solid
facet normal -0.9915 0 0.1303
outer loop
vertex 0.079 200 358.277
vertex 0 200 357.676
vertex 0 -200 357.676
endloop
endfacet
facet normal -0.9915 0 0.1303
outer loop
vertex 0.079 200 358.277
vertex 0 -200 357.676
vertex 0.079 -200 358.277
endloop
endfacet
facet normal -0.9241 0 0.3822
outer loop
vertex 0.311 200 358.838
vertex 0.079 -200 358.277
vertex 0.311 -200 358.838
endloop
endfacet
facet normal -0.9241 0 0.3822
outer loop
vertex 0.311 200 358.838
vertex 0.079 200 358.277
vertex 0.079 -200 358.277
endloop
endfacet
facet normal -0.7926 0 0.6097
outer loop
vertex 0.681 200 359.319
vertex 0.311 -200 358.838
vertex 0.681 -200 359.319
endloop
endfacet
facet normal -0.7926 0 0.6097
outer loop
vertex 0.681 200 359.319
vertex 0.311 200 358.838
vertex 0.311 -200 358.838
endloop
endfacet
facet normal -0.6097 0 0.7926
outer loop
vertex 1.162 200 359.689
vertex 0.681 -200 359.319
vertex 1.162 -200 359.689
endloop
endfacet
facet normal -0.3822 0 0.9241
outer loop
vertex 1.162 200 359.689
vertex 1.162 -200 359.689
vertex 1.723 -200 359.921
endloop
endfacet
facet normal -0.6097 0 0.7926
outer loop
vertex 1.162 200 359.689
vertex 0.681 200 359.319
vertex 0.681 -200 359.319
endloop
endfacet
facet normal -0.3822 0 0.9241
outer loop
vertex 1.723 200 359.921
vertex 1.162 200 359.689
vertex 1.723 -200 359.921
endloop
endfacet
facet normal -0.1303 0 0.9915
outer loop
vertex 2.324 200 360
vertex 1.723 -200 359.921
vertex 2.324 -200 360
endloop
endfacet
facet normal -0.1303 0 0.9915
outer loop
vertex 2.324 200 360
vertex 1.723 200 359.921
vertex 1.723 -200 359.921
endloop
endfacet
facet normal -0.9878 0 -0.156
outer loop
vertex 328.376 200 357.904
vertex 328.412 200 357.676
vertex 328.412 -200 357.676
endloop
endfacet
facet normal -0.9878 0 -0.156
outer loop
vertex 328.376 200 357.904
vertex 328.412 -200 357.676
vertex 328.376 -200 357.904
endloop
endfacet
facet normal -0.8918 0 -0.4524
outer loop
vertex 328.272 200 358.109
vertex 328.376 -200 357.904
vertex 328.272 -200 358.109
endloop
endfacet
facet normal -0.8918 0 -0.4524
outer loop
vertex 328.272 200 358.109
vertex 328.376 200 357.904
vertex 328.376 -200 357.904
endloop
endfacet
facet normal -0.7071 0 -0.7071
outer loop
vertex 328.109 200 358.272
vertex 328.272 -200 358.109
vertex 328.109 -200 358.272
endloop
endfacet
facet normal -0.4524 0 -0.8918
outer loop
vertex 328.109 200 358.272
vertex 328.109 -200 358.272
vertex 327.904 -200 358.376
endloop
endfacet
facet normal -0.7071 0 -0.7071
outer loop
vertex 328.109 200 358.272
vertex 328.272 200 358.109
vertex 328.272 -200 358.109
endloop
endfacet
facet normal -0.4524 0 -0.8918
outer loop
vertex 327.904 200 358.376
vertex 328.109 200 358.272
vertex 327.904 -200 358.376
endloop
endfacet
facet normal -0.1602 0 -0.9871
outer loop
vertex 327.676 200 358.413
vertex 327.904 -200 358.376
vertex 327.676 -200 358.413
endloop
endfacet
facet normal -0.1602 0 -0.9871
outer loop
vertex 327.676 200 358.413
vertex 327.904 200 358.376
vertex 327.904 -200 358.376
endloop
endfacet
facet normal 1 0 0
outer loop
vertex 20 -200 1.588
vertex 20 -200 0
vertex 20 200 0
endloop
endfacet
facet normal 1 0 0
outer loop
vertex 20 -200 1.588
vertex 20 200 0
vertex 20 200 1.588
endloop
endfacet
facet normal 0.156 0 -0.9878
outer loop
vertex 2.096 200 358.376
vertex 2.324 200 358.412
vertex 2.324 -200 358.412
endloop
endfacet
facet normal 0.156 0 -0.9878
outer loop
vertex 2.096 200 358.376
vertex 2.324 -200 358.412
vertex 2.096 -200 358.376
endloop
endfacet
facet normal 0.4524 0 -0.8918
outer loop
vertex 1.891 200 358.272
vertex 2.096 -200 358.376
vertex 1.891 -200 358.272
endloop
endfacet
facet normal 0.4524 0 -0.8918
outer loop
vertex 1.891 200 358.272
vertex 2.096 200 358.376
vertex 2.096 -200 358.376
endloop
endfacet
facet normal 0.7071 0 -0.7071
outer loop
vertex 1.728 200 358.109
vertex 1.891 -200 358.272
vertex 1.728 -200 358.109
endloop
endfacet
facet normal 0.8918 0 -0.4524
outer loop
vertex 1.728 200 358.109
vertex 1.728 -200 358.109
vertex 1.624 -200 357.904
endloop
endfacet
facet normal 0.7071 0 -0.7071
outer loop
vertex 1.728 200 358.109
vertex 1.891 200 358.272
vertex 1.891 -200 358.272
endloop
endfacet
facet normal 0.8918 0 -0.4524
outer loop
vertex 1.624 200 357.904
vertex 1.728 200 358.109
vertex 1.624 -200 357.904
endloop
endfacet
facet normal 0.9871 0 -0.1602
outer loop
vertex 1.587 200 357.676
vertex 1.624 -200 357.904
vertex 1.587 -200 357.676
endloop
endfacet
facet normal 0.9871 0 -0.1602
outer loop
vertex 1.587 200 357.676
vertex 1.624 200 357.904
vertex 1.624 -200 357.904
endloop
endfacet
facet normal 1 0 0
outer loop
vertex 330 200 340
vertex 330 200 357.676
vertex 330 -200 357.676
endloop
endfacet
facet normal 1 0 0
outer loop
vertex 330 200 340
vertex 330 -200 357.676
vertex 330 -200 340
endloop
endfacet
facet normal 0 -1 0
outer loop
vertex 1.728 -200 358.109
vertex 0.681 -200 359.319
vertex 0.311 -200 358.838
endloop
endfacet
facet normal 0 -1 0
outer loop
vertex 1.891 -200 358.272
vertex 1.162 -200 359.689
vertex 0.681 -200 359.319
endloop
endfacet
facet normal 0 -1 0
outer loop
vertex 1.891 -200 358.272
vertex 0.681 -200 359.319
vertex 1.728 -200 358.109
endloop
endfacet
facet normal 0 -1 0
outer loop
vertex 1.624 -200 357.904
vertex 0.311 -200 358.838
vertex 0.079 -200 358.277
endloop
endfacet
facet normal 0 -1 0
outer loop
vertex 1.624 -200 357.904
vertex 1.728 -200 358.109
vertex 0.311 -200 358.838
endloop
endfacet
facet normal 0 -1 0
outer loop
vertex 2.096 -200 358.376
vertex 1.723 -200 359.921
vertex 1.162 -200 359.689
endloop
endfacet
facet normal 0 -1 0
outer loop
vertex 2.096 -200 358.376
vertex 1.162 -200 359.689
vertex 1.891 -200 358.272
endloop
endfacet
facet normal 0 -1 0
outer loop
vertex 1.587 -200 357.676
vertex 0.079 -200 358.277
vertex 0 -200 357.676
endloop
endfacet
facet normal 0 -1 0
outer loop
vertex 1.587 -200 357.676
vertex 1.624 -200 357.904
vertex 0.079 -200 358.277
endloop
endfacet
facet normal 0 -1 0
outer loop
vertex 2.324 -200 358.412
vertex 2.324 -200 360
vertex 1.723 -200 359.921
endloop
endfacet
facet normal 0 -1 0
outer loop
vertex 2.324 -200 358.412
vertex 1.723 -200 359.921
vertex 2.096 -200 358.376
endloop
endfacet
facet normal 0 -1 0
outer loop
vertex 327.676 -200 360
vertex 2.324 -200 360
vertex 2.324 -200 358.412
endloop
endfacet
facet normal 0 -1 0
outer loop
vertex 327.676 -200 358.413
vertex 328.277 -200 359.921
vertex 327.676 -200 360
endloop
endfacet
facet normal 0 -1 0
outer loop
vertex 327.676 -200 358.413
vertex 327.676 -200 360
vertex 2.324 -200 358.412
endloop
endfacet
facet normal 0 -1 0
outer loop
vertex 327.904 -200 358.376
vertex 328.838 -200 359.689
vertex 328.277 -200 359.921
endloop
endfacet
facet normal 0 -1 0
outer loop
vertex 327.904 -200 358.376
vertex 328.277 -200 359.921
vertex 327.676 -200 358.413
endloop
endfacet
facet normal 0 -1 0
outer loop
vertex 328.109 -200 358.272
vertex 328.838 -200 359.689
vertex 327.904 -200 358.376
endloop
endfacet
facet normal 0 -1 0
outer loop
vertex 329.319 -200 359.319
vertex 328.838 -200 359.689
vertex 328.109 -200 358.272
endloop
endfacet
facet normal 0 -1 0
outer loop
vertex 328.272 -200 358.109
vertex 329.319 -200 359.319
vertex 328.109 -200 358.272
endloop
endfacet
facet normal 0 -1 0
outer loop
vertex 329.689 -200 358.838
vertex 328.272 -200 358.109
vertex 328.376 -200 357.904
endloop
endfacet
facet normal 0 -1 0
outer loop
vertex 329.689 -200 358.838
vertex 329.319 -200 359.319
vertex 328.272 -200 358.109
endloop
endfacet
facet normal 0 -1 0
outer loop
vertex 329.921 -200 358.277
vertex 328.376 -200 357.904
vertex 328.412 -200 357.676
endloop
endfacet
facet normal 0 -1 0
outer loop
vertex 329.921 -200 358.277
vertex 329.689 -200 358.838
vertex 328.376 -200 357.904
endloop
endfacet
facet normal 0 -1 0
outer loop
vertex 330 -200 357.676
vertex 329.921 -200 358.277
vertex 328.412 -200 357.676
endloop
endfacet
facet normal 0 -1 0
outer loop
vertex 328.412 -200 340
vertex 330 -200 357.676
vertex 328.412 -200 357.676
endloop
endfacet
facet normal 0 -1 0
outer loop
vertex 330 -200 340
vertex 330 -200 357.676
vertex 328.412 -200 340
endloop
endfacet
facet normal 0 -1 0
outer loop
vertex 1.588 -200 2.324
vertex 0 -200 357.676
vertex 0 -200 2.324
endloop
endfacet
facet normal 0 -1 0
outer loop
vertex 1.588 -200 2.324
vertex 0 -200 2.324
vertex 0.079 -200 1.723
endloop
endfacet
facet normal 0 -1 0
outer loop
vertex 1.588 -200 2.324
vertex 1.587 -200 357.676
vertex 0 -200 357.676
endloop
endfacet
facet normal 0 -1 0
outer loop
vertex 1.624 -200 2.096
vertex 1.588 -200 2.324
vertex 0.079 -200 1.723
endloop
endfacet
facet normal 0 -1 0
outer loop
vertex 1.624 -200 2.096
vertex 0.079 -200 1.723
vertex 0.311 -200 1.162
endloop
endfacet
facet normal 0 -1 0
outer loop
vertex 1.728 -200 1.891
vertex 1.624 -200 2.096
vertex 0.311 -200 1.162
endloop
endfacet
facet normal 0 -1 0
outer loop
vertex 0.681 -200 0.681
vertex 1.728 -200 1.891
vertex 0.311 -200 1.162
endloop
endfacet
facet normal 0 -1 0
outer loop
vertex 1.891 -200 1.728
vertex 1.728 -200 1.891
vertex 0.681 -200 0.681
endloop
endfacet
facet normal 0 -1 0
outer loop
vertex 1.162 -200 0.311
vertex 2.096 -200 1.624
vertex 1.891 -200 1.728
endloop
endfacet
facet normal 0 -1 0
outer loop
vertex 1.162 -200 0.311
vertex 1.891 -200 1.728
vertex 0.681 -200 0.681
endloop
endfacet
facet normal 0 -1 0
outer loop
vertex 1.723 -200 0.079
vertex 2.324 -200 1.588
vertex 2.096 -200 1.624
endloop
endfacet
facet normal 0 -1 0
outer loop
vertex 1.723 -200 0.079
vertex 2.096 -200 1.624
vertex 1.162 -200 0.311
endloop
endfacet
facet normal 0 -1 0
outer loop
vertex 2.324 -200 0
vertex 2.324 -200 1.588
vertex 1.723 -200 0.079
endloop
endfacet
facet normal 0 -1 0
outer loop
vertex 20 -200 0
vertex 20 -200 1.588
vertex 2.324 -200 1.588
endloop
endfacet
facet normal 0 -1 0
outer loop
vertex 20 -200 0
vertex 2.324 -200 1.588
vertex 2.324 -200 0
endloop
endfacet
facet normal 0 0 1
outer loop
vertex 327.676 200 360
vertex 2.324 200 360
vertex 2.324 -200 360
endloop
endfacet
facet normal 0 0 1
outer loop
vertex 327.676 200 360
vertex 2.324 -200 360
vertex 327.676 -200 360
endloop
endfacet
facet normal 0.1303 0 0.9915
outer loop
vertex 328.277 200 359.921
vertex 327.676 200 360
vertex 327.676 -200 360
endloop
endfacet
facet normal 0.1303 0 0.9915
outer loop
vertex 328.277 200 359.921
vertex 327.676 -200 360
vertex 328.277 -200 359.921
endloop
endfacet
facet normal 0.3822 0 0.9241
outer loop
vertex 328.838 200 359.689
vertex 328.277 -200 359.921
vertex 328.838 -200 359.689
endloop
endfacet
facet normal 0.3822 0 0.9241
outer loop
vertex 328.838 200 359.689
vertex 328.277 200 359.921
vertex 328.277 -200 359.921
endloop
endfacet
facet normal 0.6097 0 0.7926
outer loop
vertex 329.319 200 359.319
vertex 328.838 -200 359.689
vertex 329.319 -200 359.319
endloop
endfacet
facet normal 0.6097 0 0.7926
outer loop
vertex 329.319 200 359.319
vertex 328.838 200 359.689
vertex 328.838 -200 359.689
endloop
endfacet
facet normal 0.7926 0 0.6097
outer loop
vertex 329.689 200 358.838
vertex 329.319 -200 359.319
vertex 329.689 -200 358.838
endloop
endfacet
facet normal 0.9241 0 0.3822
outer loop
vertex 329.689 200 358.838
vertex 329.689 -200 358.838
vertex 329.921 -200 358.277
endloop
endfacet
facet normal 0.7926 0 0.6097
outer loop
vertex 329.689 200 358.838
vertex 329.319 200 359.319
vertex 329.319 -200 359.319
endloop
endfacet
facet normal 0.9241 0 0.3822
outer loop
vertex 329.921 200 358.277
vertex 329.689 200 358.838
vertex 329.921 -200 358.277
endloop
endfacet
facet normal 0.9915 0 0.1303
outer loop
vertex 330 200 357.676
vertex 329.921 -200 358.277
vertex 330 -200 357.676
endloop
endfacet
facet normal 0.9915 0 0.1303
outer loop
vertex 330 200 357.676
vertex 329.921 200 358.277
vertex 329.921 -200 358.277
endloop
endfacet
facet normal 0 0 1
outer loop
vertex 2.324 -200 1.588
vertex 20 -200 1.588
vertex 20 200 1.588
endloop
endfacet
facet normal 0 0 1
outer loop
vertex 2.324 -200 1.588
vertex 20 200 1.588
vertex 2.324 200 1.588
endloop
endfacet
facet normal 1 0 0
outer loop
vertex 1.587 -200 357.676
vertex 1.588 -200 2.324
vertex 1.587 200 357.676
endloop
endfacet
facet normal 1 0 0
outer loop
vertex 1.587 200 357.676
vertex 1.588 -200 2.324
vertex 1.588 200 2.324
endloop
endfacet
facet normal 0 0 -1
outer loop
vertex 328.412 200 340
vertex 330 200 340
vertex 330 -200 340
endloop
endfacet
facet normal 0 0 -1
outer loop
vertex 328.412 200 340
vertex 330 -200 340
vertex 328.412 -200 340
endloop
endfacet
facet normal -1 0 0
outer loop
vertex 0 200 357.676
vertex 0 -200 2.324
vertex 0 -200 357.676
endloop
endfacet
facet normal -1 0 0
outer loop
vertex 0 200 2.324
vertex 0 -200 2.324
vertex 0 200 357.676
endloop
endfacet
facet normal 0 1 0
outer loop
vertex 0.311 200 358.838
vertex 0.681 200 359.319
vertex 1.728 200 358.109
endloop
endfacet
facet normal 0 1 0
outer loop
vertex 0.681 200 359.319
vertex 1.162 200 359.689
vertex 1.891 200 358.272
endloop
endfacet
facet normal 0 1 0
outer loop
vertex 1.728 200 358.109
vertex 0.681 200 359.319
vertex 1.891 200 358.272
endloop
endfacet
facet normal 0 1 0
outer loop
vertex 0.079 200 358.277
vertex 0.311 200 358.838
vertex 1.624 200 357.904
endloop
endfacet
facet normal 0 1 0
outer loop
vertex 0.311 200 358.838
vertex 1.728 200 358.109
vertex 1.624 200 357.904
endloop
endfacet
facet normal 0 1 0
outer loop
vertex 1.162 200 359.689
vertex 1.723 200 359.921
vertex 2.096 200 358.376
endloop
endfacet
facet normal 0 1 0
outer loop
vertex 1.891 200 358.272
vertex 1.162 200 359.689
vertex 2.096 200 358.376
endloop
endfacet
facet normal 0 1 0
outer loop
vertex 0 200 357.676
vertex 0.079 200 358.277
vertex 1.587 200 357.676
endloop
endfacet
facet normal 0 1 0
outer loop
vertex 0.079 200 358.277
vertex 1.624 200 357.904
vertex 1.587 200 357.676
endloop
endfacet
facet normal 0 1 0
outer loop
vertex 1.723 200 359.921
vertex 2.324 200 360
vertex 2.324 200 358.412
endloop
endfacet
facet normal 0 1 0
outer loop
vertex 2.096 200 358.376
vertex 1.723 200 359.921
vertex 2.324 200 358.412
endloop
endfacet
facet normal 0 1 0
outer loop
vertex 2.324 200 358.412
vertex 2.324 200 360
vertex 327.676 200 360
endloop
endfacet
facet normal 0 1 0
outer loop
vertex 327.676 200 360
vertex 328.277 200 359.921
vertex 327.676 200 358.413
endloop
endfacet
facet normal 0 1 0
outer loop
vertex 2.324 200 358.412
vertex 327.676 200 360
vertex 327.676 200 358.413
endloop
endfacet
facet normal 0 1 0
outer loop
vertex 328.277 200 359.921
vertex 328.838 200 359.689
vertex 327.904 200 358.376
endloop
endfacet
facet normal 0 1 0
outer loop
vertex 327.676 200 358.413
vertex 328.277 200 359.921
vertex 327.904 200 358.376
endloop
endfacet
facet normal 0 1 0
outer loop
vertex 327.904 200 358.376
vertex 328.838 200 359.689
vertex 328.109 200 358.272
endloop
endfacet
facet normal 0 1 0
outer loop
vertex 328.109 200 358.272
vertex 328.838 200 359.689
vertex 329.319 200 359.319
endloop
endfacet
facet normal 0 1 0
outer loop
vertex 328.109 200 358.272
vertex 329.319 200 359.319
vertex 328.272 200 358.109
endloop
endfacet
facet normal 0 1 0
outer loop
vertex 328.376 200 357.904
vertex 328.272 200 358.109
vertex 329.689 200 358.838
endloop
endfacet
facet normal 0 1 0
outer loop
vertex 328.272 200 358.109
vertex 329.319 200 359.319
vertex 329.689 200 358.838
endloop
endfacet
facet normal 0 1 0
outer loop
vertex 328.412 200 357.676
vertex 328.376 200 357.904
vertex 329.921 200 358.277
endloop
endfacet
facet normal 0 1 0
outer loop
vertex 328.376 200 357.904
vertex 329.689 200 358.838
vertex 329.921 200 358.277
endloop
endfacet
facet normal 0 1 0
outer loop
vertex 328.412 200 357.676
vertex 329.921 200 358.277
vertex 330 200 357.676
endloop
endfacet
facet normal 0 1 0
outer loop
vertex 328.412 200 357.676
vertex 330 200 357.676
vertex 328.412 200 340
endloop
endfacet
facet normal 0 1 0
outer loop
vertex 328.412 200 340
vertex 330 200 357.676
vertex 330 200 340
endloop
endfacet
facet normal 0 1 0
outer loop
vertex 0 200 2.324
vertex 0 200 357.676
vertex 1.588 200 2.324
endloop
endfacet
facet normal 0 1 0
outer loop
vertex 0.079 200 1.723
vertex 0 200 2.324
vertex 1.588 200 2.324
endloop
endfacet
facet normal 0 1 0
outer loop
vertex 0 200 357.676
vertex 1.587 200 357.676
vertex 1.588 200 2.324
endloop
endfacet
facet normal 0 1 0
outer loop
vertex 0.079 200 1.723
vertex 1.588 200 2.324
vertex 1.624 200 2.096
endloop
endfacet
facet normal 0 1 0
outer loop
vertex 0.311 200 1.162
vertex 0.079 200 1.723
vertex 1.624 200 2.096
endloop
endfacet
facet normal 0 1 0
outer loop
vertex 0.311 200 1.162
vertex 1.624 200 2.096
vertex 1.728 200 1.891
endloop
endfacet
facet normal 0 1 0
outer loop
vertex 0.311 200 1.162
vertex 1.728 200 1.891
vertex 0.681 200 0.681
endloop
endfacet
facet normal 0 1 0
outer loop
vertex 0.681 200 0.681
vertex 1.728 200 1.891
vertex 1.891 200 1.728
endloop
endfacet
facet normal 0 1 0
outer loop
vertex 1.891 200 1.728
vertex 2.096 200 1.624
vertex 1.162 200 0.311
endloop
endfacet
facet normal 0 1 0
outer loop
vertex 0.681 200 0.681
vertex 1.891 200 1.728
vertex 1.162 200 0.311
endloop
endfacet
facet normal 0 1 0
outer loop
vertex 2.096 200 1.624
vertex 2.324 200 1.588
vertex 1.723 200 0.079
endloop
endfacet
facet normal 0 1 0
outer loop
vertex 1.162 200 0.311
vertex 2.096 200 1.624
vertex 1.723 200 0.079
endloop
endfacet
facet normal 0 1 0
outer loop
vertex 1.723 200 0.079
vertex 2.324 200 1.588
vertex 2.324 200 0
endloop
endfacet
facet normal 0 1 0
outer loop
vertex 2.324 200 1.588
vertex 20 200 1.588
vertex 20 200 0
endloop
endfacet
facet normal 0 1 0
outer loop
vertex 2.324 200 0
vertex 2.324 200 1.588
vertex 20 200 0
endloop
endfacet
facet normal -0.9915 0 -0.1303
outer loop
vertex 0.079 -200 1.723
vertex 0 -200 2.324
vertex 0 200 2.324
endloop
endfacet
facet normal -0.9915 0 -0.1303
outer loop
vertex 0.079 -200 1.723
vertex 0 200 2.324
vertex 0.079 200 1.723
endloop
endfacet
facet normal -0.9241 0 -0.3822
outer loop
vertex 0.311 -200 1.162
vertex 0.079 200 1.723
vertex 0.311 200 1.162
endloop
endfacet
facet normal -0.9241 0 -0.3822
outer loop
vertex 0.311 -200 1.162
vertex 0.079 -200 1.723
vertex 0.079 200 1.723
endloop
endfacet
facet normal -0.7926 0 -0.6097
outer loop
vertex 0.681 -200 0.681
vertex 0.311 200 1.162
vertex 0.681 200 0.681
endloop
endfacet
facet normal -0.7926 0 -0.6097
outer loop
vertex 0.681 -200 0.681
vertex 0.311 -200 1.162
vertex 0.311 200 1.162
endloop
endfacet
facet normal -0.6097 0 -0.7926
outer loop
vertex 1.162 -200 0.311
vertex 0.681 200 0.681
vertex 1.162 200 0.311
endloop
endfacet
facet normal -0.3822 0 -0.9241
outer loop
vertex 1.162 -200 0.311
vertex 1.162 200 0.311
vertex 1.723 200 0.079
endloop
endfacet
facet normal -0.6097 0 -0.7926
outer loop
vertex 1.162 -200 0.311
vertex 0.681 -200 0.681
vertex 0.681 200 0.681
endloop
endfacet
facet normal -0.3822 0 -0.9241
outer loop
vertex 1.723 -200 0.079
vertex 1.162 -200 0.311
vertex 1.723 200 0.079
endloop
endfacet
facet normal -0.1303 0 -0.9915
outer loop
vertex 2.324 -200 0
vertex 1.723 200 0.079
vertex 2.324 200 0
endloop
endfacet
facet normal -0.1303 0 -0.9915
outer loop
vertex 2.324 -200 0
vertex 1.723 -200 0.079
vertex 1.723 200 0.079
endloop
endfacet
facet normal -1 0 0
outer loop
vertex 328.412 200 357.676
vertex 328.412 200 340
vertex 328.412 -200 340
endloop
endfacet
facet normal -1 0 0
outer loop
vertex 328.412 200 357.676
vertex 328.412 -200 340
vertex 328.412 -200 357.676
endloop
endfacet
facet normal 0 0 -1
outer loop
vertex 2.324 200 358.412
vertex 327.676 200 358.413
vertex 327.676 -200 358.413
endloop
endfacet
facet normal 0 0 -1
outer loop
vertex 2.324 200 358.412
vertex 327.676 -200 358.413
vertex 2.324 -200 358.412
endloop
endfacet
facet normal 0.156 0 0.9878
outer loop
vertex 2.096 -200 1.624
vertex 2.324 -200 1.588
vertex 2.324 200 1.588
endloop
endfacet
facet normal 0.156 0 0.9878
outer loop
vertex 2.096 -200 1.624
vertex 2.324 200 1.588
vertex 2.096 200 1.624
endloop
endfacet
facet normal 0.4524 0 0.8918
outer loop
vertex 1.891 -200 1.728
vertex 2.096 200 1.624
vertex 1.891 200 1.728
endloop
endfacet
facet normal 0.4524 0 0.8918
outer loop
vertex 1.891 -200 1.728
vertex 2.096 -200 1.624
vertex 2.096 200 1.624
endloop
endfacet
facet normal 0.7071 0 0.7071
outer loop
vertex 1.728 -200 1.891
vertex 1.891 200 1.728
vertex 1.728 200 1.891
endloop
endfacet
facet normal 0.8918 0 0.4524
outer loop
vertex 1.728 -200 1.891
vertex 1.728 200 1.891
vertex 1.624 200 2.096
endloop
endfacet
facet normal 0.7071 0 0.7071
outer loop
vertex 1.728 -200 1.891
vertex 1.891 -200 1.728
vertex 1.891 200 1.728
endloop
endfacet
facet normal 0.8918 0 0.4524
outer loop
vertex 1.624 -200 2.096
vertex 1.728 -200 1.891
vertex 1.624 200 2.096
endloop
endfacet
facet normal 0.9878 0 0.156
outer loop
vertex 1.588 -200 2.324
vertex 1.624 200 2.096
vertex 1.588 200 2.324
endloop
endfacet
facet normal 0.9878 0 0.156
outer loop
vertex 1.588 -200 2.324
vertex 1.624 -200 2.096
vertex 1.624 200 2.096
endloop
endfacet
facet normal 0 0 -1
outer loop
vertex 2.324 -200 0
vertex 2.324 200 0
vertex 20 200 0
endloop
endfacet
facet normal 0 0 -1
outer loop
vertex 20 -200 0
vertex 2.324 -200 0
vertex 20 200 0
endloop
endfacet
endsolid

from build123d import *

# Parameters (mm, degrees)
SKETCH1_W                      = 1.5875
SKETCH1_H                      = 400
BASE_FLANGE1_DEPTH             = 360
EDGE_FLANGE1_STRIP_W           = 7.8232
EDGE_FLANGE1_STRIP_H           = 1.5875
EDGE_FLANGE1_STRIP_CUT_DEPTH   = 400
EDGE_FLANGE1_DEPTH             = 400
EDGE_FLANGE2_STRIP_W           = 7.8232
EDGE_FLANGE2_STRIP_H           = 1.5875
EDGE_FLANGE2_STRIP_CUT_DEPTH   = 400
EDGE_FLANGE2_STRIP_2_W         = 7.8232
EDGE_FLANGE2_STRIP_2_H         = 1.5875
EDGE_FLANGE2_STRIP_CUT_2_DEPTH = 400
EDGE_FLANGE2_DEPTH             = 400
EDGE_FLANGE2_BEND_DEPTH        = 400


# Sheet-metal steps are written as plain solids
with BuildPart() as part:
    # Sketch1 → Base-Flange1 (new body)
    with BuildSketch(Plane.XY):
        with Locations((0.79375, 0)):
            Rectangle(SKETCH1_W, SKETCH1_H)
    extrude(amount=BASE_FLANGE1_DEPTH)

    # Edge-Flange1 strip (across the edge) → Edge-Flange1 strip cut (cut)
    with BuildSketch(Plane(origin=(1.5875, 200, 360), x_dir=(0, 0, -1), z_dir=(0, -1, 0))):
        with Locations((-1.5875, -0.79375)):
            Rectangle(EDGE_FLANGE1_STRIP_W, EDGE_FLANGE1_STRIP_H)
    extrude(amount=EDGE_FLANGE1_STRIP_CUT_DEPTH, mode=Mode.SUBTRACT)

    # Edge-Flange1 section (across the edge) → Edge-Flange1 (add)
    with BuildSketch(Plane(origin=(1.5875, 200, 360), x_dir=(0, 0, -1), z_dir=(0, -1, 0))):
        with BuildLine():
            Line((0, 0.7366), (0, 328.4125))
            Line((0, 328.4125), (1.5875, 328.4125))
            Line((1.5875, 328.4125), (1.5875, 0.7366))
            ThreePointArc((1.5875, 0.7366), (1.803245145, 0.215745145), (2.3241, 0))
            Line((2.3241, 0), (2.3241, -1.5875))
            ThreePointArc((2.3241, -1.5875), (0.68071313, -0.90678687), (0, 0.7366))
        make_face()
    extrude(amount=EDGE_FLANGE1_DEPTH)

    # Edge-Flange2 strip (across the edge) → Edge-Flange2 strip cut (cut)
    with BuildSketch(Plane(origin=(330, 200, 358.4125), x_dir=(-1, 0, 0), z_dir=(0, -1, 0))):
        with Locations((-1.5875, -0.79375)):
            Rectangle(EDGE_FLANGE2_STRIP_W, EDGE_FLANGE2_STRIP_H)
    extrude(amount=EDGE_FLANGE2_STRIP_CUT_DEPTH, mode=Mode.SUBTRACT)

    # Edge-Flange2 strip 2 (across the edge) → Edge-Flange2 strip cut 2 (cut)
    with BuildSketch(Plane(origin=(1.5875, -200, 0), x_dir=(0, 0, 1), z_dir=(0, 1, 0))):
        with Locations((-1.5875, -0.79375)):
            Rectangle(EDGE_FLANGE2_STRIP_2_W, EDGE_FLANGE2_STRIP_2_H)
    extrude(amount=EDGE_FLANGE2_STRIP_CUT_2_DEPTH, mode=Mode.SUBTRACT)

    # Edge-Flange2 section (across the edge) → Edge-Flange2 (add)
    with BuildSketch(Plane(origin=(330, 200, 358.4125), x_dir=(-1, 0, 0), z_dir=(0, -1, 0))):
        with BuildLine():
            Line((0, 0.7366), (0, 18.4125))
            Line((0, 18.4125), (1.5875, 18.4125))
            Line((1.5875, 18.4125), (1.5875, 0.7366))
            ThreePointArc((1.5875, 0.7366), (1.803245145, 0.215745145), (2.3241, 0))
            Line((2.3241, 0), (2.3241, -1.5875))
            ThreePointArc((2.3241, -1.5875), (0.68071313, -0.90678687), (0, 0.7366))
        make_face()
    extrude(amount=EDGE_FLANGE2_DEPTH)

    # Edge-Flange2 section 2 (across the edge) → Edge-Flange2 bend (add)
    with BuildSketch(Plane(origin=(1.5875, -200, 0), x_dir=(0, 0, 1), z_dir=(0, 1, 0))):
        with BuildLine():
            Line((0, 0.7366), (0, 18.4125))
            Line((0, 18.4125), (1.5875, 18.4125))
            Line((1.5875, 18.4125), (1.5875, 0.7366))
            ThreePointArc((1.5875, 0.7366), (1.803245145, 0.215745145), (2.3241, 0))
            Line((2.3241, 0), (2.3241, -1.5875))
            ThreePointArc((2.3241, -1.5875), (0.68071313, -0.90678687), (0, 0.7366))
        make_face()
    extrude(amount=EDGE_FLANGE2_BEND_DEPTH)


solid = part.part
